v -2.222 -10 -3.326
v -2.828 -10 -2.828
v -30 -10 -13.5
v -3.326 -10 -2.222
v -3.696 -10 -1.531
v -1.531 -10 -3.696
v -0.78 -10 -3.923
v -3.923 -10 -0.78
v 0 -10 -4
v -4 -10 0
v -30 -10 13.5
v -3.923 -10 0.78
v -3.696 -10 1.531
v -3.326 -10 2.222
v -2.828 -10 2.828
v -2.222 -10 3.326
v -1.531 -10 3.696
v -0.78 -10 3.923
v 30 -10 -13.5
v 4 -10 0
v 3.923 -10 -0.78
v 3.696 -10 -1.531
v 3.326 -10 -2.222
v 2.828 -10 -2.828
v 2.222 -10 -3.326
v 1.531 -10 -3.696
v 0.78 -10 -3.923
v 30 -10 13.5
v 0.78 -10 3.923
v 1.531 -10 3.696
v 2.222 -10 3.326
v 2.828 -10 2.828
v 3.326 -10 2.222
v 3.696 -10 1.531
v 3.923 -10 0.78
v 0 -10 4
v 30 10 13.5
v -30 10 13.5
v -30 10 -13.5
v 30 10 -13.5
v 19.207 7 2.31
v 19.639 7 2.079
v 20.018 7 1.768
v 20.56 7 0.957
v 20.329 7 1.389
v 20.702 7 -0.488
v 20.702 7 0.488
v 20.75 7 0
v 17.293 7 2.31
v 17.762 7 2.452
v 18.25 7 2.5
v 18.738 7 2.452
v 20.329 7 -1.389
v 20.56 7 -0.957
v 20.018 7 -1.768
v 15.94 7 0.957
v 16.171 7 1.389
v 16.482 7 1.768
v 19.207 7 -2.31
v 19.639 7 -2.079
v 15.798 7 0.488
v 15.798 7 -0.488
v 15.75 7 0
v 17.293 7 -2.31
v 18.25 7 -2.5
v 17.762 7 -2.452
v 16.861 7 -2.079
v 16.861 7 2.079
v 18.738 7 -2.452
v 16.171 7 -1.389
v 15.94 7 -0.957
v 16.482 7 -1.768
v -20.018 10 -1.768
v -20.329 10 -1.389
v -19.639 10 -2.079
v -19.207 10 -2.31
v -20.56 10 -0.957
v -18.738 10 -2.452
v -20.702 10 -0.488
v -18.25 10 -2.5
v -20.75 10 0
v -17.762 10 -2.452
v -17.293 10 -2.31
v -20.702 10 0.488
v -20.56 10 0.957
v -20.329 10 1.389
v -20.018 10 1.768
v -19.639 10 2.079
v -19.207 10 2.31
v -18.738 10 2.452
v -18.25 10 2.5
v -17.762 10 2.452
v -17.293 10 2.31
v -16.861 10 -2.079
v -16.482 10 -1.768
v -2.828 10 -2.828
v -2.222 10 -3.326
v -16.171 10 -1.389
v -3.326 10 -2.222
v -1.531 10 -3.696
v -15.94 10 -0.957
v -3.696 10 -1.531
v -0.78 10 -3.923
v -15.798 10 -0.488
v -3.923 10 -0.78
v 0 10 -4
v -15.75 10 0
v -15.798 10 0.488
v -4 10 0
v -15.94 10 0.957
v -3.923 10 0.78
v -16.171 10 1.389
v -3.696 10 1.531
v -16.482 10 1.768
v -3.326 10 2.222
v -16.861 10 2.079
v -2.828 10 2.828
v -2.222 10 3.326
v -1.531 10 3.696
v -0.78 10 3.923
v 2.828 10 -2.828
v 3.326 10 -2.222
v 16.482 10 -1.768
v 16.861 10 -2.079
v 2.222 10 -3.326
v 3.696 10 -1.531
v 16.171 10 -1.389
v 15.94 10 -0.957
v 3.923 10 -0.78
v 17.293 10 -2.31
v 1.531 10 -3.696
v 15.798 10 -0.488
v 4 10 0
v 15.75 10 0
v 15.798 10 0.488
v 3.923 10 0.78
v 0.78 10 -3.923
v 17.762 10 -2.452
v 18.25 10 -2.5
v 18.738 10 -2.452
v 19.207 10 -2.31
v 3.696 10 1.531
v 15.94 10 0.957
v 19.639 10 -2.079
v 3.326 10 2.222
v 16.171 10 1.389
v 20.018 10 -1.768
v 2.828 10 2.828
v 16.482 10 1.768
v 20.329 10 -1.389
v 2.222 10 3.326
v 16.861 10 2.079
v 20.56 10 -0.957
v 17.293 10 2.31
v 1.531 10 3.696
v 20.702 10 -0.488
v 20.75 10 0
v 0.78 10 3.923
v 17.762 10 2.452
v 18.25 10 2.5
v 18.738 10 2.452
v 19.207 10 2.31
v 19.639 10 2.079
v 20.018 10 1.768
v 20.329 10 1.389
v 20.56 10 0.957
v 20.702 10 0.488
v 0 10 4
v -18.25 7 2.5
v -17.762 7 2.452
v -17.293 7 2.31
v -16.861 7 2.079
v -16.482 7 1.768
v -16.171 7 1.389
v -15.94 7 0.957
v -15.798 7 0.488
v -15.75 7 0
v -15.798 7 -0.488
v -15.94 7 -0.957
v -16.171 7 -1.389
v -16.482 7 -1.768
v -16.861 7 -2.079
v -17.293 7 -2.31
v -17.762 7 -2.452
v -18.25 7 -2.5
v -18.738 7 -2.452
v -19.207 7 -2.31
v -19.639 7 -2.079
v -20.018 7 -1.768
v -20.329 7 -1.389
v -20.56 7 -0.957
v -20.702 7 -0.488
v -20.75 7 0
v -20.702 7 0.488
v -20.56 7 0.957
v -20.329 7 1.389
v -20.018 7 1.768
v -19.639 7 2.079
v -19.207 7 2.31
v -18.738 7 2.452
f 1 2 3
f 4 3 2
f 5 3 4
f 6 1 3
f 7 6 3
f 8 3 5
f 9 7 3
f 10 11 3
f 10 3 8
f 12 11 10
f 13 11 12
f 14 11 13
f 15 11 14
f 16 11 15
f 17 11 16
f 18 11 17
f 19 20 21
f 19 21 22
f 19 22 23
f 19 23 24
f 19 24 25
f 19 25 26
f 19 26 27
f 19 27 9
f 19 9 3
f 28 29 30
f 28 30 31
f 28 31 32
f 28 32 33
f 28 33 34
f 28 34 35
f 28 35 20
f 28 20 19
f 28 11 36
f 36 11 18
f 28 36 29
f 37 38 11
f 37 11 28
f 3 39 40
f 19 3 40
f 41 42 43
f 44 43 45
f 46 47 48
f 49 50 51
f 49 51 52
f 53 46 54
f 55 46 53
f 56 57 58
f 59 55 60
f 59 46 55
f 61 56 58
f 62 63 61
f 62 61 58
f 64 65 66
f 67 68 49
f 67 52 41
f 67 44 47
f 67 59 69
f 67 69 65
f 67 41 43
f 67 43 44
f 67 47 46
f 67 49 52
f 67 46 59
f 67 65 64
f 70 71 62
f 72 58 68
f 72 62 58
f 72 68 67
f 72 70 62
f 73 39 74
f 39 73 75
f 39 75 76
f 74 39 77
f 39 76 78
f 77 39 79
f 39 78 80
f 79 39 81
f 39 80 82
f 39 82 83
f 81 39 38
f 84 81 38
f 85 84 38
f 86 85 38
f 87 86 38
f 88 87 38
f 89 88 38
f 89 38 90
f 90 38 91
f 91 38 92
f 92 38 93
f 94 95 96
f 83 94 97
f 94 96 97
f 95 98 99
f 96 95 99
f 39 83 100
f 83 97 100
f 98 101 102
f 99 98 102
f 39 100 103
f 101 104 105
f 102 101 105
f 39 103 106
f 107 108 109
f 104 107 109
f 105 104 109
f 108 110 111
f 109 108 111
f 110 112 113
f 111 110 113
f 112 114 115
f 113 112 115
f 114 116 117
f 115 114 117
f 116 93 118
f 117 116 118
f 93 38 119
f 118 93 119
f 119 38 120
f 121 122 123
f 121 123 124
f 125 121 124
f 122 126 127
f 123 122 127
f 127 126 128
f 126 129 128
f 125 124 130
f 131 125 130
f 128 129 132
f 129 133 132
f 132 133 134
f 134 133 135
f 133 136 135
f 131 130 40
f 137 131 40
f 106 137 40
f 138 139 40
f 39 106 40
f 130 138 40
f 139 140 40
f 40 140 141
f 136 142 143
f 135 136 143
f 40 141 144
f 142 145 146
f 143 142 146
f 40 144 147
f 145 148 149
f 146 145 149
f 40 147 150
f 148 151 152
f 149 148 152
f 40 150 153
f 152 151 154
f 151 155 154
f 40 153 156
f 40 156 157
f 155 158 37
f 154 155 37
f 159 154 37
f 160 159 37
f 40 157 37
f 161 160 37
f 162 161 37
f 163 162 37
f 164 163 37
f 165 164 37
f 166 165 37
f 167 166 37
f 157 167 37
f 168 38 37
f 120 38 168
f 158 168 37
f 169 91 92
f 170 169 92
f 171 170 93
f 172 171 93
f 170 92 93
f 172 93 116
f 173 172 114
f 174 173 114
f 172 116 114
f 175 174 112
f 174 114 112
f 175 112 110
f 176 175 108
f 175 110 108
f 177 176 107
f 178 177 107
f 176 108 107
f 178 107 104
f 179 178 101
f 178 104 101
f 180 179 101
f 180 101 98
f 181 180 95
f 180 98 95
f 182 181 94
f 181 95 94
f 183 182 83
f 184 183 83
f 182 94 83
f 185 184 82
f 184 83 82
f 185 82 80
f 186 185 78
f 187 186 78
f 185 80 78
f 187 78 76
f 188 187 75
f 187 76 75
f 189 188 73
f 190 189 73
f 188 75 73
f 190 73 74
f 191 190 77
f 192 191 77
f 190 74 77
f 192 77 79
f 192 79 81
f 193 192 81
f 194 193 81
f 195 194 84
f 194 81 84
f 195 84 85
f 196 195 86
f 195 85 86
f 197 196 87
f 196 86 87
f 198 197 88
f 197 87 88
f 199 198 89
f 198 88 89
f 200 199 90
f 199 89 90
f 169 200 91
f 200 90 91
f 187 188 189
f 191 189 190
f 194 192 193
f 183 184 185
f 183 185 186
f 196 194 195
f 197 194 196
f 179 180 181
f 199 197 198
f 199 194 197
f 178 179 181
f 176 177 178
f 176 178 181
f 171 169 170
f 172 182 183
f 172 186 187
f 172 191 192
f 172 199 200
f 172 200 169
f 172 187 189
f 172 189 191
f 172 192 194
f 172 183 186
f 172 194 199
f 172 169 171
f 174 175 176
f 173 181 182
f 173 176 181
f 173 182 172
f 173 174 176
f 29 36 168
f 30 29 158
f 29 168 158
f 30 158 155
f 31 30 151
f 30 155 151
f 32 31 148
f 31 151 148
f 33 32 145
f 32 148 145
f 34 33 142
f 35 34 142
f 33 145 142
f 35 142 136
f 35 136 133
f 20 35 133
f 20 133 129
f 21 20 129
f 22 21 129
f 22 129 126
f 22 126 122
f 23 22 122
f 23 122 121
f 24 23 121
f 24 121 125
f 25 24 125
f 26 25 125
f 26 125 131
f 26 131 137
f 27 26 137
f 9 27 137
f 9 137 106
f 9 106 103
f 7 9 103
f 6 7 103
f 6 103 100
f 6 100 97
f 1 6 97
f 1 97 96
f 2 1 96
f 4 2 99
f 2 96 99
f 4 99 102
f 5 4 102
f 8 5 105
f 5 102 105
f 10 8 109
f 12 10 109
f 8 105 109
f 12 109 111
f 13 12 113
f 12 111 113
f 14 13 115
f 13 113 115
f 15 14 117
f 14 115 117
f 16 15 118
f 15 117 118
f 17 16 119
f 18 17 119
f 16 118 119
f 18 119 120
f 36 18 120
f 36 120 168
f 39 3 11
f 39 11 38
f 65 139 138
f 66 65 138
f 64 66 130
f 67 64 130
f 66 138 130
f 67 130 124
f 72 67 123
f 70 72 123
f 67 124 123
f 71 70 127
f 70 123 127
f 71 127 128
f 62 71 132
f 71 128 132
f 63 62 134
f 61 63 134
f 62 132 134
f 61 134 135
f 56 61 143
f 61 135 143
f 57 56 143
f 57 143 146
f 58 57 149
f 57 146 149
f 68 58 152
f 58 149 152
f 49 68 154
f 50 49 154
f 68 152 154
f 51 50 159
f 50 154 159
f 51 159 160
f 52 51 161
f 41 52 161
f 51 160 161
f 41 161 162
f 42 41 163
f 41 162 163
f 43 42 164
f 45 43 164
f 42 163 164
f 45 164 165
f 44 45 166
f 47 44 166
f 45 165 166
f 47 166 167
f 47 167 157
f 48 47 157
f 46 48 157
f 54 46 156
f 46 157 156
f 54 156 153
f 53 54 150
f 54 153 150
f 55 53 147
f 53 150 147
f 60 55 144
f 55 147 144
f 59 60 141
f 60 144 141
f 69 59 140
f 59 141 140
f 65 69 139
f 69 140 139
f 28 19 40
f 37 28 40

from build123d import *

# Parameters (mm, degrees)
SKETCH2_W           = 60
SKETCH2_H           = 20
BOSS_EXTRUDE1_DEPTH = 13.5
SKETCH3_R           = 2.5
CUT_EXTRUDE1_DEPTH  = 3
SKETCH4_R           = 4
CUT_EXTRUDE2_DEPTH  = 39.5


with BuildPart() as part:
    # Sketch2 → Boss-Extrude1 (new, symmetric)
    with BuildSketch(Plane.XY):
        Rectangle(SKETCH2_W, SKETCH2_H)
    extrude(amount=BOSS_EXTRUDE1_DEPTH, both=True)

    # Sketch3 → Cut-Extrude1 (cut)
    with BuildSketch(Plane(origin=(0, 10, 0), x_dir=(1, 0, 0), z_dir=(0, 1, 0))):
        with Locations(Location((-18.25, 0, 0), (0, 0, 270))):
            Circle(SKETCH3_R)
        with Locations(Location((18.25, 0, 0), (0, 0, 90))):
            Circle(SKETCH3_R)
    extrude(amount=-CUT_EXTRUDE1_DEPTH, mode=Mode.SUBTRACT)

    # Sketch4 → Cut-Extrude2 (cut, through all)
    with BuildSketch(Plane(origin=(0, 10, 0), x_dir=(1, 0, 0), z_dir=(0, 1, 0))):
        with Locations(Location((0, 0, 0), (0, 0, 270))):
            Circle(SKETCH4_R)
    extrude(amount=-CUT_EXTRUDE2_DEPTH, mode=Mode.SUBTRACT)


solid = part.part
